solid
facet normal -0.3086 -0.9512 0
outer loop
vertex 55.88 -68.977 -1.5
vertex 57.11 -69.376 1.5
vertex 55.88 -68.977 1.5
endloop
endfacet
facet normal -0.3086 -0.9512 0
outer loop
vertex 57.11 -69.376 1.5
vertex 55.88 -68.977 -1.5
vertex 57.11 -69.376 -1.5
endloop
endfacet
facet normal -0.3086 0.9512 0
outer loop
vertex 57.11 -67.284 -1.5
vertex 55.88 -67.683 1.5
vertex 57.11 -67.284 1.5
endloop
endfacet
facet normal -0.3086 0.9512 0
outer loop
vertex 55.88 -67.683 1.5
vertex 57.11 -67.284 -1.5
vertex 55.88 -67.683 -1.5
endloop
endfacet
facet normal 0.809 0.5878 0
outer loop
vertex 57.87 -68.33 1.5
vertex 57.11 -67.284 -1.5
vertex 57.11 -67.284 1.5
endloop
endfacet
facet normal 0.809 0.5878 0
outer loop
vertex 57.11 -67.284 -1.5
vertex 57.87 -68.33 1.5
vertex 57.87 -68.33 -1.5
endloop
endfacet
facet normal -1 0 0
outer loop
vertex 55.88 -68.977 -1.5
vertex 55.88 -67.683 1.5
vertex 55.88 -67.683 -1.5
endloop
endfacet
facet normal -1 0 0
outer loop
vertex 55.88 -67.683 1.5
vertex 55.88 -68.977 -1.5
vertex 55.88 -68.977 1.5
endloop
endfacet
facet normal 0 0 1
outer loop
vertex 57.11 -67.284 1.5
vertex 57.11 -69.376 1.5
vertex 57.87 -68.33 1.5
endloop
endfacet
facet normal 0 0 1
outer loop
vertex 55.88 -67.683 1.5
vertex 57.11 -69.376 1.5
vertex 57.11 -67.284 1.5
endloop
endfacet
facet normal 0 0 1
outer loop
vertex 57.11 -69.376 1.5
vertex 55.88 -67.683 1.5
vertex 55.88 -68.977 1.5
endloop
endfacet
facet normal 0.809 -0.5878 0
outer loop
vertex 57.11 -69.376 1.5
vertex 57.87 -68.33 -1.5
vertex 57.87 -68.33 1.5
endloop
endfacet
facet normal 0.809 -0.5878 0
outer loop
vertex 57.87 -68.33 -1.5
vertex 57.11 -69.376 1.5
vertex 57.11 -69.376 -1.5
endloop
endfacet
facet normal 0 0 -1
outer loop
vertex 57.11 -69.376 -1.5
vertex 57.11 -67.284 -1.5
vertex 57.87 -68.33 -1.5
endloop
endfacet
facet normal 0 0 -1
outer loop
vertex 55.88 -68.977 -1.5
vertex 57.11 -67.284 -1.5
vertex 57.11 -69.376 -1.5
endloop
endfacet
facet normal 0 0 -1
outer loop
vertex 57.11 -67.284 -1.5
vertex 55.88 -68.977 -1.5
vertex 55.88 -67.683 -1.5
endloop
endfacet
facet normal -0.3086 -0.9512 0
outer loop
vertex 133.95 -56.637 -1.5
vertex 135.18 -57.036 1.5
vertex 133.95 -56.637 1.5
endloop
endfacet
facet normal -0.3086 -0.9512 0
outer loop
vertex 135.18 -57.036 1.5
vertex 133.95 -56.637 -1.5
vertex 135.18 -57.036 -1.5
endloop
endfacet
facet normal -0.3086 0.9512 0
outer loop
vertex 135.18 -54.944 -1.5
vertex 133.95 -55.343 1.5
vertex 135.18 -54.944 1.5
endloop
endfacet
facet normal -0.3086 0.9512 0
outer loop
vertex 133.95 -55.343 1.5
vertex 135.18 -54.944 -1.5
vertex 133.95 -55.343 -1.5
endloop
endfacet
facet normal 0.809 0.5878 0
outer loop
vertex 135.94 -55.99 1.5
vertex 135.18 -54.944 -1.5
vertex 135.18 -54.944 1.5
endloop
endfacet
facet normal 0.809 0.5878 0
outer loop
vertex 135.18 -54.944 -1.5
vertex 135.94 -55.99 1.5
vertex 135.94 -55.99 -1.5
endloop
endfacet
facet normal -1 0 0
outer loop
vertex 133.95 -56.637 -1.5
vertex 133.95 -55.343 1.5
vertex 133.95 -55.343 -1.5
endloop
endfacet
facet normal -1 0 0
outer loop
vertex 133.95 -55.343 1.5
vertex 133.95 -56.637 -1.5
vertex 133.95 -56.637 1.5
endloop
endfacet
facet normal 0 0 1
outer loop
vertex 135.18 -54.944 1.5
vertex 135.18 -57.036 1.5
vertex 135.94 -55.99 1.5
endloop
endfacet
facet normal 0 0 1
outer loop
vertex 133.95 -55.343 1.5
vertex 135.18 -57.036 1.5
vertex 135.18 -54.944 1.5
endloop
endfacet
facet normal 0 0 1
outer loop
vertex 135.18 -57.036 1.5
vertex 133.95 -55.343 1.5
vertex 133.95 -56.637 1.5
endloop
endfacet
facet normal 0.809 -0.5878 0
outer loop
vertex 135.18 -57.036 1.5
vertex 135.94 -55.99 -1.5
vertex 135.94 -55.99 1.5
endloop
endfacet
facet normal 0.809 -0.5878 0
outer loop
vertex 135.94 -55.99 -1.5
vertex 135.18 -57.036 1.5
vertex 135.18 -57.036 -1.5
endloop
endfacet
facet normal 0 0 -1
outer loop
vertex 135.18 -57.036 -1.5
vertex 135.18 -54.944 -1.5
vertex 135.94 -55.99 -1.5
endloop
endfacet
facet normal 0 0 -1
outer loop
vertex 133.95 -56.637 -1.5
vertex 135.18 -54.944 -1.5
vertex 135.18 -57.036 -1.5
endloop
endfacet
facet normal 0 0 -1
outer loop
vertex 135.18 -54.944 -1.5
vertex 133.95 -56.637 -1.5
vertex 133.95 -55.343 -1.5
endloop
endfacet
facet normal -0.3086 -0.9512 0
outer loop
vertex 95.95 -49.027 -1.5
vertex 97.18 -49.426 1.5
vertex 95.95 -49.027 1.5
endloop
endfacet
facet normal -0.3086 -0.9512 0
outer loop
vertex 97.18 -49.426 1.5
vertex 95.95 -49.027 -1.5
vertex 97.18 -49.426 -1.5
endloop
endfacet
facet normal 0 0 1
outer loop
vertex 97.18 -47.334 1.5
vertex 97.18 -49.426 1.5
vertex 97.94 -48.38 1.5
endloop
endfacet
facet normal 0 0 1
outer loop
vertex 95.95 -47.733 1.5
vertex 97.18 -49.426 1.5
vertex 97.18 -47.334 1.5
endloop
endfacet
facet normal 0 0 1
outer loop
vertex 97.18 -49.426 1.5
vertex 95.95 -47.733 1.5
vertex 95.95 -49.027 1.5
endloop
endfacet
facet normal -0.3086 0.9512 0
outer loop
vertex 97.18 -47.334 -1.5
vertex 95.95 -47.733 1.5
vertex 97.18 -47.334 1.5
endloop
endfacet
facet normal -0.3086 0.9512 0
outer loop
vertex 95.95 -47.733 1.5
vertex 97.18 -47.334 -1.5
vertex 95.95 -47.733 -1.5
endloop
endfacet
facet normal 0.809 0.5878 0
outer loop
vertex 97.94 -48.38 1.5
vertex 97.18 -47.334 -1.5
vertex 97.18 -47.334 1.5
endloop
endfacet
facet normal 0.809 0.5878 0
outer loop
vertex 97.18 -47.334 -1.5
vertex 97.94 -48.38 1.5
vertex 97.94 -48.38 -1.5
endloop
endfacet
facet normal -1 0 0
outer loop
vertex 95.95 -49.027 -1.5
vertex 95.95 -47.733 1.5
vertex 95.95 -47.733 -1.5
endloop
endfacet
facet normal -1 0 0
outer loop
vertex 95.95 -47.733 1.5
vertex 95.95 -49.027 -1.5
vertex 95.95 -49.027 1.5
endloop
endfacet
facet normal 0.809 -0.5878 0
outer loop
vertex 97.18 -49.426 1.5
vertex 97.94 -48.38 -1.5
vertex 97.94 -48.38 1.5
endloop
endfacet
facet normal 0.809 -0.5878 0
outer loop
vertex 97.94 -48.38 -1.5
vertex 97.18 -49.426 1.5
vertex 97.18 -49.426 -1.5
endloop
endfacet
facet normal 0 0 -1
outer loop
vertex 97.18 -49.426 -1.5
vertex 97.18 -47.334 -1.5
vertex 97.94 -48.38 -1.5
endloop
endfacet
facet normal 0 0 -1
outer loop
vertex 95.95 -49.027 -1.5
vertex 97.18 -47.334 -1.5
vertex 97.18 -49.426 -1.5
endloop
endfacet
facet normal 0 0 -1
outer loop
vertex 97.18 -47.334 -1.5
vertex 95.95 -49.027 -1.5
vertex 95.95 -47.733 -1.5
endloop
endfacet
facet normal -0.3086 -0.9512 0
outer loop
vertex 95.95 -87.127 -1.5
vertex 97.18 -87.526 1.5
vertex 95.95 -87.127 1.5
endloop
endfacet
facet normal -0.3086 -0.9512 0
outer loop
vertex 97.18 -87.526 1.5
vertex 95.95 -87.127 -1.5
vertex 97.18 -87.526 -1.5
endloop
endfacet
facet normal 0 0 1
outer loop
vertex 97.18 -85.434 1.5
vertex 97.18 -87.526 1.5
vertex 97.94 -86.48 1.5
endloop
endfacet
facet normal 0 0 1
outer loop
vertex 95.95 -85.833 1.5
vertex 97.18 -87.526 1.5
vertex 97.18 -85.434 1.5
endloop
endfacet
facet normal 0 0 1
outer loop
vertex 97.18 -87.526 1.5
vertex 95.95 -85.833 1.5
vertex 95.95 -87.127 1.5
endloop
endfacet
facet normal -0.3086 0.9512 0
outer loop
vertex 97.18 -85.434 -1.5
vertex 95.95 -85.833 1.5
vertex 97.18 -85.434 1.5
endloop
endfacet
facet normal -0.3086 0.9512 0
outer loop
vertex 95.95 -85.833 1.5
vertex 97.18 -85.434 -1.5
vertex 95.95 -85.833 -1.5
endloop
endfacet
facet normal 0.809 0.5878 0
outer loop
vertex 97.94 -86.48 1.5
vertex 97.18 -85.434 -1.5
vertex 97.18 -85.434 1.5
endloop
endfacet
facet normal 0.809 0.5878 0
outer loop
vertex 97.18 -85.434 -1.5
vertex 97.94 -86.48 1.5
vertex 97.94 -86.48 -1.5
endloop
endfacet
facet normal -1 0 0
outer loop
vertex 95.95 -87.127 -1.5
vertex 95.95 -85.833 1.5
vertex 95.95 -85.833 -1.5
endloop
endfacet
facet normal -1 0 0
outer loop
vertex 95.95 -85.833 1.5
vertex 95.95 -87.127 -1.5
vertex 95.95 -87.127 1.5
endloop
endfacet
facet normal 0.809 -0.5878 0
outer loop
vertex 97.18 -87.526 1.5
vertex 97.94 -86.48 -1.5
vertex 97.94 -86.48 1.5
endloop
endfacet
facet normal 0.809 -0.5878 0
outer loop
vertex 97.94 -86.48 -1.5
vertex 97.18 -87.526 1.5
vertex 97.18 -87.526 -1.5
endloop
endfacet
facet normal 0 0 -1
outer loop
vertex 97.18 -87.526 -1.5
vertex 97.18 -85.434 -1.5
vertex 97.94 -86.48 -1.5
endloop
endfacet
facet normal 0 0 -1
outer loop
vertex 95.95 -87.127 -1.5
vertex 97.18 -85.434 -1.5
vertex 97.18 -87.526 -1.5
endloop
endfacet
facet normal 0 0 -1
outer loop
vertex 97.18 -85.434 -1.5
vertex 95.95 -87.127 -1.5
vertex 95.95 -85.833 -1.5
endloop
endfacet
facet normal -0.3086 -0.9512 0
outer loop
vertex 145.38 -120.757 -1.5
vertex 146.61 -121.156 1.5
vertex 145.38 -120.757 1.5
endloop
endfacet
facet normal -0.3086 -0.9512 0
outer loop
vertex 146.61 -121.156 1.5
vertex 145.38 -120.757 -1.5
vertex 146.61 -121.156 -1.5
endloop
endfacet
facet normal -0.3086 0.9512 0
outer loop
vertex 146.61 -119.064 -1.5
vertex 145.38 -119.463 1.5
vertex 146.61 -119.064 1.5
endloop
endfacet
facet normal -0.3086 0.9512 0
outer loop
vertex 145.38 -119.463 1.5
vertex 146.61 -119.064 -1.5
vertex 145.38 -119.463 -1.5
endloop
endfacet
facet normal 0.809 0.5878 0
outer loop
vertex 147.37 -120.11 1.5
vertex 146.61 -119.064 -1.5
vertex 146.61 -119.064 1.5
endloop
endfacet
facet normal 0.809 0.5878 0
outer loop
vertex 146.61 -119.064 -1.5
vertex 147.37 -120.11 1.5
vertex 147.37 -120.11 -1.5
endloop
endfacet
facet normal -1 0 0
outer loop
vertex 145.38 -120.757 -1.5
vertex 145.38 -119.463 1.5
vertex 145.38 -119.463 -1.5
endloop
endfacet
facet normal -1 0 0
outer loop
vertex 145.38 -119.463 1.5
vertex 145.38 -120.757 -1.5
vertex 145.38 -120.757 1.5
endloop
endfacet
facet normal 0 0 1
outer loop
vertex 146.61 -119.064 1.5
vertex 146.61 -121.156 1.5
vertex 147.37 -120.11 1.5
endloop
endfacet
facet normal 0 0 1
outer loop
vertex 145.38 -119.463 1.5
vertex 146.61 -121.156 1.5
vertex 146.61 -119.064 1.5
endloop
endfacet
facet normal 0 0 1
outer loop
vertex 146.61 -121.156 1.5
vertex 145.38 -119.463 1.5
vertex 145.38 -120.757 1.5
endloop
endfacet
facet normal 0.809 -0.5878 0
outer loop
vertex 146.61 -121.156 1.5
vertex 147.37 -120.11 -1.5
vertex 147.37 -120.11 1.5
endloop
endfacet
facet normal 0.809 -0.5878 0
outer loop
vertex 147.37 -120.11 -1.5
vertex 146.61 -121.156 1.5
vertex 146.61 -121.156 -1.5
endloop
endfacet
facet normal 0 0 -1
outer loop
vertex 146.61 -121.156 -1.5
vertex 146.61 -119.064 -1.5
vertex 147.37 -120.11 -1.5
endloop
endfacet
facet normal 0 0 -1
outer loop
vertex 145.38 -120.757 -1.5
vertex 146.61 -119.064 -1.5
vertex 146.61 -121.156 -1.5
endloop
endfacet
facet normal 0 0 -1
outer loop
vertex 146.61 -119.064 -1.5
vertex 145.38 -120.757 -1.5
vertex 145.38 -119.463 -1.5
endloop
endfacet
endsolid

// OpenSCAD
screw_pin_h = 3;

translate([0, 0, screw_pin_h / 2]) {
  linear_extrude(5) {
    difference() {
      import("./outlines/raw.dxf");
      offset(delta=-1)
        import("./outlines/keys.dxf");
    }
  }
  translate([0, 0, 4]) {
    linear_extrude(1) {
      difference() {
        import("./outlines/raw.dxf");
        offset(delta=-2)
          import("./outlines/keys.dxf");
      }
    }
  }

  color("red") {
    // H1
    translate([56.77, -68.33, -screw_pin_h / 2])
      cylinder(h=screw_pin_h, r=1.1, center=true);
    // H2
    translate([134.84, -55.99, -screw_pin_h / 2])
      cylinder(h=screw_pin_h, r=1.1, center=true);
    // H3
    translate([96.84, -48.38, -screw_pin_h / 2])
      cylinder(h=screw_pin_h, r=1.1, center=true);
    // H4
    translate([96.84, -86.48, -screw_pin_h / 2])
      cylinder(h=screw_pin_h, r=1.1, center=true);
    // H5
    translate([146.27, -120.11, -screw_pin_h / 2])
      cylinder(h=screw_pin_h, r=1.1, center=true);
  }
}
